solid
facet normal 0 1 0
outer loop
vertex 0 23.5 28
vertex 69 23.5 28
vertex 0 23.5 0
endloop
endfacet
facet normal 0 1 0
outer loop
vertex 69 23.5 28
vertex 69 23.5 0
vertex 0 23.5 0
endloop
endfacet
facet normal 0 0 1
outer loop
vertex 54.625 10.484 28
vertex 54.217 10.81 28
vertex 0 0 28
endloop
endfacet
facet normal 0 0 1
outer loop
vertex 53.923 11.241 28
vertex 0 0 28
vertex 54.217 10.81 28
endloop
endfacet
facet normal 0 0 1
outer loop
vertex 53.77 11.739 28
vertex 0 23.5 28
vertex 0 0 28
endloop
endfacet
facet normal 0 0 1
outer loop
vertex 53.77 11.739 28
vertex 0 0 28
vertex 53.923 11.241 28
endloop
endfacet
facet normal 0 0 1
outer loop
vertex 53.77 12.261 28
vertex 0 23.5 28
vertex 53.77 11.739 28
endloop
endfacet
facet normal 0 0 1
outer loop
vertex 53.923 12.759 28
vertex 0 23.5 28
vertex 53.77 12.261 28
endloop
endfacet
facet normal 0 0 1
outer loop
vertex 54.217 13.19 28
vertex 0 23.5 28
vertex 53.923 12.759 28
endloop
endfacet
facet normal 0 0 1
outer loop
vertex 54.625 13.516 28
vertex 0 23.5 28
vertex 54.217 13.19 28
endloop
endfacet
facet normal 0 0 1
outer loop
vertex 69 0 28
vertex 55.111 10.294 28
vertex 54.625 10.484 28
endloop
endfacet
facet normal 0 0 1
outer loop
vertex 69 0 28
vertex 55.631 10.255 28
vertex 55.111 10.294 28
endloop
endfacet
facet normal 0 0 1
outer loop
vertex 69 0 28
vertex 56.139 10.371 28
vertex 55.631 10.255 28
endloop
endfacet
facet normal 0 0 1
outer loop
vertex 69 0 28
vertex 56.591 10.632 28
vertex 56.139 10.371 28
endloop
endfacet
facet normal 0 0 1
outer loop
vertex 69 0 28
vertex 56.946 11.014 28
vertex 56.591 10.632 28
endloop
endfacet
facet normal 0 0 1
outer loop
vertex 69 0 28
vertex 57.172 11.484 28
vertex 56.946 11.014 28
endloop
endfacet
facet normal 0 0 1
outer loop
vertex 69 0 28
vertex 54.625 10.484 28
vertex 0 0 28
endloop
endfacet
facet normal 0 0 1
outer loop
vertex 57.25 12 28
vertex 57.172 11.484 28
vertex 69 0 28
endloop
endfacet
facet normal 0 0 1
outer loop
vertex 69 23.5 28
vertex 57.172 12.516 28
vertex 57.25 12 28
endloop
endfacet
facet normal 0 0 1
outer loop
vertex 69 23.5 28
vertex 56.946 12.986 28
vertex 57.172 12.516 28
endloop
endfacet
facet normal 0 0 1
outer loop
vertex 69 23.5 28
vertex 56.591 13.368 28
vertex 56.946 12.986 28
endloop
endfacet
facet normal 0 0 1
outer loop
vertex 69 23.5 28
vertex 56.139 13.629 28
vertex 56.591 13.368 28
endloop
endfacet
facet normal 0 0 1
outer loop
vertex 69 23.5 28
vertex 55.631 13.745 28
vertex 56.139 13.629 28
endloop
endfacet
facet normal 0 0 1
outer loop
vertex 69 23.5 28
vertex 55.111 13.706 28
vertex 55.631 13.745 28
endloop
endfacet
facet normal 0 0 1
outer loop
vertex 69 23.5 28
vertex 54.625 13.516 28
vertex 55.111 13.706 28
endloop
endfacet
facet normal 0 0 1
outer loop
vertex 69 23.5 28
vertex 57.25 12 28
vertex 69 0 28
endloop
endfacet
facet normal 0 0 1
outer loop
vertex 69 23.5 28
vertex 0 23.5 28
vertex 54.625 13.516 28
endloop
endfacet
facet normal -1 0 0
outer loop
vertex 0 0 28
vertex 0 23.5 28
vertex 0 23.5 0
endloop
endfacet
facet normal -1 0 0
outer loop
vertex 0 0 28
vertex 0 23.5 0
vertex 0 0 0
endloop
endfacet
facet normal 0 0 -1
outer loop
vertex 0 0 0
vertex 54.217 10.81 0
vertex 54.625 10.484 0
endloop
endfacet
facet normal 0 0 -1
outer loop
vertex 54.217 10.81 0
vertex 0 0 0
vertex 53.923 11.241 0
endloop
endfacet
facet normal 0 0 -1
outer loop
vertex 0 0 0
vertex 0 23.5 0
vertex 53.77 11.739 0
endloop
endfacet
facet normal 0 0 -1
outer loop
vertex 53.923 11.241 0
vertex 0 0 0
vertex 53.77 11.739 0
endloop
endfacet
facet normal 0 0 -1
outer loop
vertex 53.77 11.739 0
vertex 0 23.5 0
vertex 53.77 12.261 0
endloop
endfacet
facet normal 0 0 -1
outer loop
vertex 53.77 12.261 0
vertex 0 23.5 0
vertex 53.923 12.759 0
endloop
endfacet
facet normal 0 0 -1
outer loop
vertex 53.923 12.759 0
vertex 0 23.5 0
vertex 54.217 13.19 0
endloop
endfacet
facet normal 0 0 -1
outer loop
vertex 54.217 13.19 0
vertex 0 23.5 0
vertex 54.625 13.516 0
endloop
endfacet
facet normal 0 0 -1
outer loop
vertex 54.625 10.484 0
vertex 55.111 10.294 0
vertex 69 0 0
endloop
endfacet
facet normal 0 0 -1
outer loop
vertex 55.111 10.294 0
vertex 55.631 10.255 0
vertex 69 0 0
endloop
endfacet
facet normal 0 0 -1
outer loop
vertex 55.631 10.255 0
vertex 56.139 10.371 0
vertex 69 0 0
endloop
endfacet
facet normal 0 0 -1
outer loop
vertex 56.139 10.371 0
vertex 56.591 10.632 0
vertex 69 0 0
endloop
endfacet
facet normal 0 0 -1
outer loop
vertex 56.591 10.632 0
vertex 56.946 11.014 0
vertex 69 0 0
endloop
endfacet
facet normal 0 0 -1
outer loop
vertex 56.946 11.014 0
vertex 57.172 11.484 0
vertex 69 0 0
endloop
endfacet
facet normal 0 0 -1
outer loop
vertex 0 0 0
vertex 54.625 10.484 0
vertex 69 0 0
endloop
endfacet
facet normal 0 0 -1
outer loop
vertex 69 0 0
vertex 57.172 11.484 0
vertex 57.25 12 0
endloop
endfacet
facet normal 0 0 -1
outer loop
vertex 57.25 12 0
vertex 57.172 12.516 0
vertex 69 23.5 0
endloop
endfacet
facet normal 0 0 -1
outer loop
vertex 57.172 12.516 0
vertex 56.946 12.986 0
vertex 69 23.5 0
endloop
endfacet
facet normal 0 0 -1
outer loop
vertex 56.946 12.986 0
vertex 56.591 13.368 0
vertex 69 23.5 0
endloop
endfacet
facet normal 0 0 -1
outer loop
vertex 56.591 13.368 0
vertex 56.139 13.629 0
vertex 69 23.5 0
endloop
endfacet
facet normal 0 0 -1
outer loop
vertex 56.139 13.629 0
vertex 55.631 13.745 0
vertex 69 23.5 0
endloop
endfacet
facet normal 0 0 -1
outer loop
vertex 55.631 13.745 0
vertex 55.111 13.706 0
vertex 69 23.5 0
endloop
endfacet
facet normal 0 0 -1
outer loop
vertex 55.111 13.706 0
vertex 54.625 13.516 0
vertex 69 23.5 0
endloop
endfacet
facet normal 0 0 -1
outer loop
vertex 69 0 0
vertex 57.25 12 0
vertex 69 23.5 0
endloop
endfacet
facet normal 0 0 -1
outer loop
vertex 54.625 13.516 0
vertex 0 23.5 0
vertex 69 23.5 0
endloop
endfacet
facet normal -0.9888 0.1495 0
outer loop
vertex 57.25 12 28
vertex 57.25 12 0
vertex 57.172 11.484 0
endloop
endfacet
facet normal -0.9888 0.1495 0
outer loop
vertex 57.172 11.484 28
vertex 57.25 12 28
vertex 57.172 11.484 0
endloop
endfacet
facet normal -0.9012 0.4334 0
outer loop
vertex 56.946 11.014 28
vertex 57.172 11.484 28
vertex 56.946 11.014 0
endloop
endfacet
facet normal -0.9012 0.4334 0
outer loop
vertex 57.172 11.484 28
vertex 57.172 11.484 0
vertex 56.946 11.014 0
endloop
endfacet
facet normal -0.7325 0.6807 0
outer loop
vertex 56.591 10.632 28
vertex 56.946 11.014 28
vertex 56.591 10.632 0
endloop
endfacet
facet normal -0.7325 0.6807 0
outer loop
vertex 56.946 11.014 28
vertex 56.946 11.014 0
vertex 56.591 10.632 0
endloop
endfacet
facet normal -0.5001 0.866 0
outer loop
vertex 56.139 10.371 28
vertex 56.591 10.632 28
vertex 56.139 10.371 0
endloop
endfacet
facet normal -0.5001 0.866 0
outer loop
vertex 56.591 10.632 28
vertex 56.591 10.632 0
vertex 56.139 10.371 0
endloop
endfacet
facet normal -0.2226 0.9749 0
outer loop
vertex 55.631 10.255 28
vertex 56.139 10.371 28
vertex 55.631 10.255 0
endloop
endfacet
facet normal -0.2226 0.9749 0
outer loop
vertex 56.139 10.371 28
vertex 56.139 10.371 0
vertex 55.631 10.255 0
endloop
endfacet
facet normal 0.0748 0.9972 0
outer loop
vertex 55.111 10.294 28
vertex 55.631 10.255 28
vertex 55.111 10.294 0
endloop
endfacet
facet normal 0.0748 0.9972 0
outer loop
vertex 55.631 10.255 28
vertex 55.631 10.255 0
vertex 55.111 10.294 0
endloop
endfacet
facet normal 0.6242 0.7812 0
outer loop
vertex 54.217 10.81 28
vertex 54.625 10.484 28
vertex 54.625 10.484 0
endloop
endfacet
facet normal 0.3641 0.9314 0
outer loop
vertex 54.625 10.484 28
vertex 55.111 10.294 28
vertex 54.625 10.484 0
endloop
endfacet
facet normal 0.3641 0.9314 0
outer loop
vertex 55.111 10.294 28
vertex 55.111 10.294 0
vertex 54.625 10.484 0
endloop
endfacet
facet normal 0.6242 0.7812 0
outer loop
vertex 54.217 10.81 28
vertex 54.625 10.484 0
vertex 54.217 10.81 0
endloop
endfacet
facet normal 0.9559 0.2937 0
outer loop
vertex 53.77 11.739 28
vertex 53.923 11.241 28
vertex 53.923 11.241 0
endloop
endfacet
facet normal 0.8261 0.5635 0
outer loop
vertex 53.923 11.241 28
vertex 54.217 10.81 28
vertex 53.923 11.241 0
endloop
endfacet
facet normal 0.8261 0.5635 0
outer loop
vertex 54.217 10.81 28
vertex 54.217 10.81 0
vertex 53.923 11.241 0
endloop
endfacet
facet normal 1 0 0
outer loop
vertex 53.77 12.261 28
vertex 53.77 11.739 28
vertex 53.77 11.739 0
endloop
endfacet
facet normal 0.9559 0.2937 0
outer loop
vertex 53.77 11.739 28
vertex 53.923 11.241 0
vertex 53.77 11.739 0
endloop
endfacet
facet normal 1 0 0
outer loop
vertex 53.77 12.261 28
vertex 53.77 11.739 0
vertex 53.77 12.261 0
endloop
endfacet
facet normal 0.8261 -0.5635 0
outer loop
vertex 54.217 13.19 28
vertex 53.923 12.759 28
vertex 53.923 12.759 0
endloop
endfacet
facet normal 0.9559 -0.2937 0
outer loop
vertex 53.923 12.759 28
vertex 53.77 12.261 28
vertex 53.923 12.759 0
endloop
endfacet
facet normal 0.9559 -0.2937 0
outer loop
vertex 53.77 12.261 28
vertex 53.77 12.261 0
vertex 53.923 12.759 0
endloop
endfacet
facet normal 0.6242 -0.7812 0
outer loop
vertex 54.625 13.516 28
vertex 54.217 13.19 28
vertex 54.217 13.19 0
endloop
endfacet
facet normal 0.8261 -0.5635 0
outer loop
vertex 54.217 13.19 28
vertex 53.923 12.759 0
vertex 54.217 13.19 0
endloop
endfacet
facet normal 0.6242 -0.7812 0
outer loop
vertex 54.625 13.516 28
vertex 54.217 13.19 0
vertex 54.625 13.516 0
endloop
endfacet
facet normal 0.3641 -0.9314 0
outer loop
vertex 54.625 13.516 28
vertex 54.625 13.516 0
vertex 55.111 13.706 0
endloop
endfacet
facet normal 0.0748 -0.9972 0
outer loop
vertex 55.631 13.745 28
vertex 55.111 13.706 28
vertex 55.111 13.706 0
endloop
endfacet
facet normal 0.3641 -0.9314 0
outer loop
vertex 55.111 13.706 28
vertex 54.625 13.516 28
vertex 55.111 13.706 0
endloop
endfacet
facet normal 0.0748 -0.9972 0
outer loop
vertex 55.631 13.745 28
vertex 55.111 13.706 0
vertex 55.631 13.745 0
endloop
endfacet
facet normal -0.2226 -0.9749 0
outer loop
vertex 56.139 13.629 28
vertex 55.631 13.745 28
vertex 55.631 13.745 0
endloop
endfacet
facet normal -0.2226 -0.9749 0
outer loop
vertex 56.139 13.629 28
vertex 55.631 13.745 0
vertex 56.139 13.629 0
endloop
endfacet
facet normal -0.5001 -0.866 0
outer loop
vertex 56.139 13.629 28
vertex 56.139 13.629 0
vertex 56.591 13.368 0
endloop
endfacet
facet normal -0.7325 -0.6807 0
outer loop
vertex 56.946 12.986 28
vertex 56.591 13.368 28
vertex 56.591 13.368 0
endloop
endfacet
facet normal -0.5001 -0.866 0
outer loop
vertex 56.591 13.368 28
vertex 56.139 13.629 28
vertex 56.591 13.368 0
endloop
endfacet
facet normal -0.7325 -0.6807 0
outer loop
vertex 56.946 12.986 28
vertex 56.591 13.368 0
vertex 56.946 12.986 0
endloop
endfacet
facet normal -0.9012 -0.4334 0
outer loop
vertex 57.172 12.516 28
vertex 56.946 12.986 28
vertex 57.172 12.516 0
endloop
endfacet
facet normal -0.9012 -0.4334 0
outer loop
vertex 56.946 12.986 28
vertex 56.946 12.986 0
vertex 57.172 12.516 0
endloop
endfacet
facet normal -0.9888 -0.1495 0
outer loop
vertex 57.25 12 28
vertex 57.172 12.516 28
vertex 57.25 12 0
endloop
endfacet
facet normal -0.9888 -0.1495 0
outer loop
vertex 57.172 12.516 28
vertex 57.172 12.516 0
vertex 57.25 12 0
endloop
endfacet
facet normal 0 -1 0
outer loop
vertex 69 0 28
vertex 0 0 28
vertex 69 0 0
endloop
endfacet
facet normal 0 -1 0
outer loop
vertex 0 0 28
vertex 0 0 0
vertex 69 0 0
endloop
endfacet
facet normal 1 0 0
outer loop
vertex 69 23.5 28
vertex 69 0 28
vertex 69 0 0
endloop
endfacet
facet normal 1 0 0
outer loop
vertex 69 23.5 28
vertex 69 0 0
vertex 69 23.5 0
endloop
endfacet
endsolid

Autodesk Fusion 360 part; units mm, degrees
sketch "スケッチ1" plane through (0, 0, 0) normal (0, 0, 1) x (1, 0, 0)
  line L0 (0, 0) -> (69, 0)
  line L1 (69, 0) -> (69, 23.5)
  line L2 (69, 23.5) -> (0, 23.5)
  line L3 (0, 23.5) -> (0, 0)
  circle A0 centre (55.5, 12) radius 1.75
  dimension "d1" = 12
  dimension "d2" = 3.5
  dimension "d3" = 23.5
  dimension "d4" = 69
  dimension "d5" = 13.5
extrude "押し出し1" add sketch "スケッチ1" along normal blind 28
